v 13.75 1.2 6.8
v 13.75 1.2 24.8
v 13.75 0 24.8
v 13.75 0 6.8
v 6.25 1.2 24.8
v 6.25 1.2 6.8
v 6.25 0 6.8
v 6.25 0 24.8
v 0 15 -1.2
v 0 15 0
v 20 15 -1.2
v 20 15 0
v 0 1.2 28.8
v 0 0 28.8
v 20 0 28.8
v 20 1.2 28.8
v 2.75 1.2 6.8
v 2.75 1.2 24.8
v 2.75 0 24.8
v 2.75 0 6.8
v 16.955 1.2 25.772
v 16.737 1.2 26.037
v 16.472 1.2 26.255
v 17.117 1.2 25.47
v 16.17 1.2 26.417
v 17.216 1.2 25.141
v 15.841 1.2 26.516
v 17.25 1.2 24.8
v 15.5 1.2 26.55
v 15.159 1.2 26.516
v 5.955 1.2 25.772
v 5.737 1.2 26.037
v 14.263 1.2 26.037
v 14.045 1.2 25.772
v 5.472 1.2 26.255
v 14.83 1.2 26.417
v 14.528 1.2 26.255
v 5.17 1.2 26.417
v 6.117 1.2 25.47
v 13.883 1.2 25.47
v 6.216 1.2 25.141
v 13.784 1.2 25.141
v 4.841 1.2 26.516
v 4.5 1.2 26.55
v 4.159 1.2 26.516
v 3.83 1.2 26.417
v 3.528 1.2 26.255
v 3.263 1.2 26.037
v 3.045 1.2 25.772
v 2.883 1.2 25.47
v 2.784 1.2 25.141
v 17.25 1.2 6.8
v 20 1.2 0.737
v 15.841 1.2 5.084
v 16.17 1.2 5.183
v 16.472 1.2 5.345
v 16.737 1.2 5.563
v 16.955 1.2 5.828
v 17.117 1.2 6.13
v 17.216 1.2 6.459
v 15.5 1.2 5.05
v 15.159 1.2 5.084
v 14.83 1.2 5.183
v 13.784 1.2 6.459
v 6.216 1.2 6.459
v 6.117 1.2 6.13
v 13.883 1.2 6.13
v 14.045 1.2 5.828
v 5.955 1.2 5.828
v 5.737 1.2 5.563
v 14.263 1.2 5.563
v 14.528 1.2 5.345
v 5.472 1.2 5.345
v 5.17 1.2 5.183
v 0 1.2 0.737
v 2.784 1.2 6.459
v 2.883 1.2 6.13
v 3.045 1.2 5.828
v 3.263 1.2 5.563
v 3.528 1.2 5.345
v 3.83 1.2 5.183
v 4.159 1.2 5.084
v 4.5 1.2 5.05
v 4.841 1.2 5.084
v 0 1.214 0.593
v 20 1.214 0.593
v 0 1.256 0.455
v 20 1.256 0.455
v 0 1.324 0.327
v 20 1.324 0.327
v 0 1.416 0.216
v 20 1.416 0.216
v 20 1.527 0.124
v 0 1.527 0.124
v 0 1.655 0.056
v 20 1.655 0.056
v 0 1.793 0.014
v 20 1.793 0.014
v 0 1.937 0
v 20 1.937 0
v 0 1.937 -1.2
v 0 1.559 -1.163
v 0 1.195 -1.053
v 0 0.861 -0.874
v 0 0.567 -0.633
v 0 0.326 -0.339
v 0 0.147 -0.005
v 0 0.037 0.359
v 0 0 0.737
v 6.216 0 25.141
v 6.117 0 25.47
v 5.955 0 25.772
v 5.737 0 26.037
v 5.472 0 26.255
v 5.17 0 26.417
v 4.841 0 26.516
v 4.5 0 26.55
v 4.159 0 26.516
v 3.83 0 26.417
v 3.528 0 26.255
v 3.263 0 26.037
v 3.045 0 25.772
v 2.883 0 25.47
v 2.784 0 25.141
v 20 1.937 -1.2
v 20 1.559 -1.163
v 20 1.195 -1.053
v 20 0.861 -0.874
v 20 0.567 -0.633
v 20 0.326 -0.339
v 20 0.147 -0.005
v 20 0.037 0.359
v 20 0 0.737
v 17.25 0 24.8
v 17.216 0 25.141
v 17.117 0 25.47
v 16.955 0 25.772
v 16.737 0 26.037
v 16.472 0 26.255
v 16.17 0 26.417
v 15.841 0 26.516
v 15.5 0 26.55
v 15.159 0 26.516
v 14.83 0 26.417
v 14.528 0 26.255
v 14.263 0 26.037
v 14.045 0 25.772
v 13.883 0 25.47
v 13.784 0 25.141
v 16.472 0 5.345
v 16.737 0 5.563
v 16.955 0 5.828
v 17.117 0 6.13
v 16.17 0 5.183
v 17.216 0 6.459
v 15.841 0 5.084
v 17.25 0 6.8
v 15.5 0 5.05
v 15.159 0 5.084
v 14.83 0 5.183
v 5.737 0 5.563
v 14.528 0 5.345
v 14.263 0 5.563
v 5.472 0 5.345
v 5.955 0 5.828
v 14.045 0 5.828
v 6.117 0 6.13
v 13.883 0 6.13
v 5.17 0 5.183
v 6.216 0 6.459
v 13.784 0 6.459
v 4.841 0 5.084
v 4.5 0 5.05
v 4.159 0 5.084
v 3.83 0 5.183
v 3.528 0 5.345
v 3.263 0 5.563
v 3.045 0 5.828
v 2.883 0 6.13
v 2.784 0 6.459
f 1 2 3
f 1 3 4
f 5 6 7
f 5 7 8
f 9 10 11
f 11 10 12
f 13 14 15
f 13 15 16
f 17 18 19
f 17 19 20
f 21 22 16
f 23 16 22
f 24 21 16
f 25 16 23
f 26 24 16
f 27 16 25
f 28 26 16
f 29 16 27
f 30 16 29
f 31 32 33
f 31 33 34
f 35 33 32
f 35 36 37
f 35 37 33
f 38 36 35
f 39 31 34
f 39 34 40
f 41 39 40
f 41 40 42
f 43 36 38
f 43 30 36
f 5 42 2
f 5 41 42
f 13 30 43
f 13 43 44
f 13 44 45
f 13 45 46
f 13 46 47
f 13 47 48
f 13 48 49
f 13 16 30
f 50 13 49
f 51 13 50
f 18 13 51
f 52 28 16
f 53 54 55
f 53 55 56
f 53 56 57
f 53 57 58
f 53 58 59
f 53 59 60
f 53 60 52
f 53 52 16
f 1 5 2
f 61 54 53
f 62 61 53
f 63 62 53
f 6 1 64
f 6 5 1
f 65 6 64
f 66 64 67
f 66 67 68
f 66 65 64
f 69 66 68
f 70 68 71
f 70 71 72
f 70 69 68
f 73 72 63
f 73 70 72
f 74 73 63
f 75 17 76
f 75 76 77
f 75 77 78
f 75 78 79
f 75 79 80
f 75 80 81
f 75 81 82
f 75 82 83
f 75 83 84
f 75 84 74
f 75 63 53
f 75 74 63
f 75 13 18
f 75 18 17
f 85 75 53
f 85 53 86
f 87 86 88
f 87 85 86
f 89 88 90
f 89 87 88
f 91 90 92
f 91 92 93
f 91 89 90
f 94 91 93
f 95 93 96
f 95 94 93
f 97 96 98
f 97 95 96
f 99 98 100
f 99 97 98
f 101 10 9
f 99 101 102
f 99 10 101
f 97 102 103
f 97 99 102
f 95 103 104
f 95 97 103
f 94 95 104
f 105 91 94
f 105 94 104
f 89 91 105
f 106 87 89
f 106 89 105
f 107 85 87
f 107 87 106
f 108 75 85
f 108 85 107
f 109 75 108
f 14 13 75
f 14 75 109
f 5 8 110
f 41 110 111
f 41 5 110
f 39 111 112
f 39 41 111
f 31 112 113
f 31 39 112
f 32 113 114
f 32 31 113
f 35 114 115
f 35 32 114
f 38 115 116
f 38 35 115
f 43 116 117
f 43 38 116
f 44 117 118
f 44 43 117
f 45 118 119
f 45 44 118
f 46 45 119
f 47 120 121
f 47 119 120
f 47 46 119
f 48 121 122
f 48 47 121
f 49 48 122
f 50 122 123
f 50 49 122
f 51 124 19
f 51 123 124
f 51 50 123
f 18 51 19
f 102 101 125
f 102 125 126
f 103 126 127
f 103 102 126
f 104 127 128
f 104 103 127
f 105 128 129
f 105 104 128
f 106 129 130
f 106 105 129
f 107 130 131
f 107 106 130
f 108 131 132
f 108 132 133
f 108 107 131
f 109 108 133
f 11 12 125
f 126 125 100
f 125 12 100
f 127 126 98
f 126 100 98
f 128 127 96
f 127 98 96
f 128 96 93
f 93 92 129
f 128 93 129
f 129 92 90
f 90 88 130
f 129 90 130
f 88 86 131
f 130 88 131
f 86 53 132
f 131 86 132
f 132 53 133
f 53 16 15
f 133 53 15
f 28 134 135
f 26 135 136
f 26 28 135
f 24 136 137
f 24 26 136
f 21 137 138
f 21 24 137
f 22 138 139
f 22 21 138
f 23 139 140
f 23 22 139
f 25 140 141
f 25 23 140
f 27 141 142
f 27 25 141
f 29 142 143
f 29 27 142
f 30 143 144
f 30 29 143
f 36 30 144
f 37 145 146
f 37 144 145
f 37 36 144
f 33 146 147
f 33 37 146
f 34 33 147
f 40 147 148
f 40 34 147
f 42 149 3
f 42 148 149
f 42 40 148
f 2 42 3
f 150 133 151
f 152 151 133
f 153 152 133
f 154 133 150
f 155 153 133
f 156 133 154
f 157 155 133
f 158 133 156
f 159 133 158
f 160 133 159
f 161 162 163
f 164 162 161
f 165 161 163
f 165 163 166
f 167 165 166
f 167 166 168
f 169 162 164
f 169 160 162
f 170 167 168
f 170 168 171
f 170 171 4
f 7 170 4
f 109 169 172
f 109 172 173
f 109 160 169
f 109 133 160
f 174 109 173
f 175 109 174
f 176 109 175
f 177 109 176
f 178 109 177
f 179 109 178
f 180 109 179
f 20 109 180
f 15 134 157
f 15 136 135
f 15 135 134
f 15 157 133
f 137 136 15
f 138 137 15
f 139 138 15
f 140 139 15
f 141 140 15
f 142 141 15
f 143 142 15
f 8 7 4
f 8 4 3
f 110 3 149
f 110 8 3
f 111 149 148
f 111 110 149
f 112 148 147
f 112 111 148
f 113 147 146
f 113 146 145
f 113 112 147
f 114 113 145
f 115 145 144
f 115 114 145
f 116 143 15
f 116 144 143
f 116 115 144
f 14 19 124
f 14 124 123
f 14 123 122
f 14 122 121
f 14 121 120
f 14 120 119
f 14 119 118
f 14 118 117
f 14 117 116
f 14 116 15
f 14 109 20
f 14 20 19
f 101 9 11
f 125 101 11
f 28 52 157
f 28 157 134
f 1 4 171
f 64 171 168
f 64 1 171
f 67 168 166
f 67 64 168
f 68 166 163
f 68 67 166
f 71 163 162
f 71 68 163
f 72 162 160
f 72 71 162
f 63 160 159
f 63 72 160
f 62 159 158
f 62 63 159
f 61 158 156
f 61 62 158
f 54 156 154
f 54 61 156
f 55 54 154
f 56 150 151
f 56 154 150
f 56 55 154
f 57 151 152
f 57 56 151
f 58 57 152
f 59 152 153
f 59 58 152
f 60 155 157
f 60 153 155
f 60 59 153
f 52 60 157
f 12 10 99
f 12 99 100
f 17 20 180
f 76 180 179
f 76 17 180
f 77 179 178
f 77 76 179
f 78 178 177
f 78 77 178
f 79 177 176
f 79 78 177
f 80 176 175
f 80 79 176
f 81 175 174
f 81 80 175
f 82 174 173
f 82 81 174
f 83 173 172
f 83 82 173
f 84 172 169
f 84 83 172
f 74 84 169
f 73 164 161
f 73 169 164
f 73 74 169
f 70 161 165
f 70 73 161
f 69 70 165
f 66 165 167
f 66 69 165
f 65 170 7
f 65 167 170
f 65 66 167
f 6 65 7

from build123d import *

# Parameters (mm, degrees)
SKETCH_1_W                       = 20
SKETCH_1_H                       = 15
SM_BASE_FLANGE_1_DEPTH           = 1.2
SM_EDGE_FLANGE_1_STRIP_W         = 6.2732
SM_EDGE_FLANGE_1_STRIP_H         = 1.2
SM_EDGE_FLANGE_1_STRIP_CUT_DEPTH = 20
SM_EDGE_FLANGE_1_DEPTH           = 20
CUT_EXTRUDE_1_REACH              = 39.681


# Sheet-metal steps are written as plain solids
with BuildPart() as part:
    # Sketch 1 → Базовая кромка1 (new body)
    with BuildSketch(Plane.XY):
        with Locations((10, 7.5)):
            Rectangle(SKETCH_1_W, SKETCH_1_H)
    extrude(amount=-SM_BASE_FLANGE_1_DEPTH)

    # Ребро-кромка1 strip (across the edge) → Ребро-кромка1 strip cut (cut)
    with BuildSketch(Plane.YZ):
        with Locations((-1.2, -0.6)):
            Rectangle(SM_EDGE_FLANGE_1_STRIP_W, SM_EDGE_FLANGE_1_STRIP_H)
    extrude(amount=SM_EDGE_FLANGE_1_STRIP_CUT_DEPTH, mode=Mode.SUBTRACT)

    # Ребро-кромка1 section (across the edge) → Ребро-кромка1 (add)
    with BuildSketch(Plane.YZ):
        with BuildLine():
            Line((0, 0.7366), (0, 28.8))
            Line((0, 28.8), (1.2, 28.8))
            Line((1.2, 28.8), (1.2, 0.7366))
            ThreePointArc((1.2, 0.7366), (1.415745145, 0.215745145), (1.9366, 0))
            Line((1.9366, 0), (1.9366, -1.2))
            ThreePointArc((1.9366, -1.2), (0.567217008, -0.632782992), (0, 0.7366))
        make_face()
    extrude(amount=SM_EDGE_FLANGE_1_DEPTH)

    # Эскиз9 → Вырез-Вытянуть1 (cut, up to next)
    with BuildSketch(Plane(origin=(0, 1.2, 0), x_dir=(1, 0, 0), z_dir=(0, 1, 0)), mode=Mode.PRIVATE) as cut_extrude_1_sk1:
        with BuildLine():
            Line((6.25, -6.8), (6.25, -24.8))
            ThreePointArc((6.25, -24.8), (4.5, -26.55), (2.75, -24.8))
            Line((2.75, -24.8), (2.75, -6.8))
            ThreePointArc((2.75, -6.8), (4.5, -5.05), (6.25, -6.8))
        make_face()
    cut_extrude_1_tool1 = extrude(cut_extrude_1_sk1.sketch, amount=-CUT_EXTRUDE_1_REACH, mode=Mode.PRIVATE) & part.part
    # Эскиз9 → Вырез-Вытянуть1 (cut, up to next)
    with BuildSketch(Plane(origin=(0, 1.2, 0), x_dir=(1, 0, 0), z_dir=(0, 1, 0)), mode=Mode.PRIVATE) as cut_extrude_1_sk2:
        with BuildLine():
            Line((17.25, -6.8), (17.25, -24.8))
            ThreePointArc((17.25, -24.8), (15.5, -26.55), (13.75, -24.8))
            Line((13.75, -24.8), (13.75, -6.8))
            ThreePointArc((13.75, -6.8), (15.5, -5.05), (17.25, -6.8))
        make_face()
    cut_extrude_1_tool2 = extrude(cut_extrude_1_sk2.sketch, amount=-CUT_EXTRUDE_1_REACH, mode=Mode.PRIVATE) & part.part
    add(cut_extrude_1_tool1.solids().sort_by_distance((4.5, 1.2, 15.8))[0], mode=Mode.SUBTRACT)
    add(cut_extrude_1_tool2.solids().sort_by_distance((15.5, 1.2, 15.8))[0], mode=Mode.SUBTRACT)


solid = part.part
